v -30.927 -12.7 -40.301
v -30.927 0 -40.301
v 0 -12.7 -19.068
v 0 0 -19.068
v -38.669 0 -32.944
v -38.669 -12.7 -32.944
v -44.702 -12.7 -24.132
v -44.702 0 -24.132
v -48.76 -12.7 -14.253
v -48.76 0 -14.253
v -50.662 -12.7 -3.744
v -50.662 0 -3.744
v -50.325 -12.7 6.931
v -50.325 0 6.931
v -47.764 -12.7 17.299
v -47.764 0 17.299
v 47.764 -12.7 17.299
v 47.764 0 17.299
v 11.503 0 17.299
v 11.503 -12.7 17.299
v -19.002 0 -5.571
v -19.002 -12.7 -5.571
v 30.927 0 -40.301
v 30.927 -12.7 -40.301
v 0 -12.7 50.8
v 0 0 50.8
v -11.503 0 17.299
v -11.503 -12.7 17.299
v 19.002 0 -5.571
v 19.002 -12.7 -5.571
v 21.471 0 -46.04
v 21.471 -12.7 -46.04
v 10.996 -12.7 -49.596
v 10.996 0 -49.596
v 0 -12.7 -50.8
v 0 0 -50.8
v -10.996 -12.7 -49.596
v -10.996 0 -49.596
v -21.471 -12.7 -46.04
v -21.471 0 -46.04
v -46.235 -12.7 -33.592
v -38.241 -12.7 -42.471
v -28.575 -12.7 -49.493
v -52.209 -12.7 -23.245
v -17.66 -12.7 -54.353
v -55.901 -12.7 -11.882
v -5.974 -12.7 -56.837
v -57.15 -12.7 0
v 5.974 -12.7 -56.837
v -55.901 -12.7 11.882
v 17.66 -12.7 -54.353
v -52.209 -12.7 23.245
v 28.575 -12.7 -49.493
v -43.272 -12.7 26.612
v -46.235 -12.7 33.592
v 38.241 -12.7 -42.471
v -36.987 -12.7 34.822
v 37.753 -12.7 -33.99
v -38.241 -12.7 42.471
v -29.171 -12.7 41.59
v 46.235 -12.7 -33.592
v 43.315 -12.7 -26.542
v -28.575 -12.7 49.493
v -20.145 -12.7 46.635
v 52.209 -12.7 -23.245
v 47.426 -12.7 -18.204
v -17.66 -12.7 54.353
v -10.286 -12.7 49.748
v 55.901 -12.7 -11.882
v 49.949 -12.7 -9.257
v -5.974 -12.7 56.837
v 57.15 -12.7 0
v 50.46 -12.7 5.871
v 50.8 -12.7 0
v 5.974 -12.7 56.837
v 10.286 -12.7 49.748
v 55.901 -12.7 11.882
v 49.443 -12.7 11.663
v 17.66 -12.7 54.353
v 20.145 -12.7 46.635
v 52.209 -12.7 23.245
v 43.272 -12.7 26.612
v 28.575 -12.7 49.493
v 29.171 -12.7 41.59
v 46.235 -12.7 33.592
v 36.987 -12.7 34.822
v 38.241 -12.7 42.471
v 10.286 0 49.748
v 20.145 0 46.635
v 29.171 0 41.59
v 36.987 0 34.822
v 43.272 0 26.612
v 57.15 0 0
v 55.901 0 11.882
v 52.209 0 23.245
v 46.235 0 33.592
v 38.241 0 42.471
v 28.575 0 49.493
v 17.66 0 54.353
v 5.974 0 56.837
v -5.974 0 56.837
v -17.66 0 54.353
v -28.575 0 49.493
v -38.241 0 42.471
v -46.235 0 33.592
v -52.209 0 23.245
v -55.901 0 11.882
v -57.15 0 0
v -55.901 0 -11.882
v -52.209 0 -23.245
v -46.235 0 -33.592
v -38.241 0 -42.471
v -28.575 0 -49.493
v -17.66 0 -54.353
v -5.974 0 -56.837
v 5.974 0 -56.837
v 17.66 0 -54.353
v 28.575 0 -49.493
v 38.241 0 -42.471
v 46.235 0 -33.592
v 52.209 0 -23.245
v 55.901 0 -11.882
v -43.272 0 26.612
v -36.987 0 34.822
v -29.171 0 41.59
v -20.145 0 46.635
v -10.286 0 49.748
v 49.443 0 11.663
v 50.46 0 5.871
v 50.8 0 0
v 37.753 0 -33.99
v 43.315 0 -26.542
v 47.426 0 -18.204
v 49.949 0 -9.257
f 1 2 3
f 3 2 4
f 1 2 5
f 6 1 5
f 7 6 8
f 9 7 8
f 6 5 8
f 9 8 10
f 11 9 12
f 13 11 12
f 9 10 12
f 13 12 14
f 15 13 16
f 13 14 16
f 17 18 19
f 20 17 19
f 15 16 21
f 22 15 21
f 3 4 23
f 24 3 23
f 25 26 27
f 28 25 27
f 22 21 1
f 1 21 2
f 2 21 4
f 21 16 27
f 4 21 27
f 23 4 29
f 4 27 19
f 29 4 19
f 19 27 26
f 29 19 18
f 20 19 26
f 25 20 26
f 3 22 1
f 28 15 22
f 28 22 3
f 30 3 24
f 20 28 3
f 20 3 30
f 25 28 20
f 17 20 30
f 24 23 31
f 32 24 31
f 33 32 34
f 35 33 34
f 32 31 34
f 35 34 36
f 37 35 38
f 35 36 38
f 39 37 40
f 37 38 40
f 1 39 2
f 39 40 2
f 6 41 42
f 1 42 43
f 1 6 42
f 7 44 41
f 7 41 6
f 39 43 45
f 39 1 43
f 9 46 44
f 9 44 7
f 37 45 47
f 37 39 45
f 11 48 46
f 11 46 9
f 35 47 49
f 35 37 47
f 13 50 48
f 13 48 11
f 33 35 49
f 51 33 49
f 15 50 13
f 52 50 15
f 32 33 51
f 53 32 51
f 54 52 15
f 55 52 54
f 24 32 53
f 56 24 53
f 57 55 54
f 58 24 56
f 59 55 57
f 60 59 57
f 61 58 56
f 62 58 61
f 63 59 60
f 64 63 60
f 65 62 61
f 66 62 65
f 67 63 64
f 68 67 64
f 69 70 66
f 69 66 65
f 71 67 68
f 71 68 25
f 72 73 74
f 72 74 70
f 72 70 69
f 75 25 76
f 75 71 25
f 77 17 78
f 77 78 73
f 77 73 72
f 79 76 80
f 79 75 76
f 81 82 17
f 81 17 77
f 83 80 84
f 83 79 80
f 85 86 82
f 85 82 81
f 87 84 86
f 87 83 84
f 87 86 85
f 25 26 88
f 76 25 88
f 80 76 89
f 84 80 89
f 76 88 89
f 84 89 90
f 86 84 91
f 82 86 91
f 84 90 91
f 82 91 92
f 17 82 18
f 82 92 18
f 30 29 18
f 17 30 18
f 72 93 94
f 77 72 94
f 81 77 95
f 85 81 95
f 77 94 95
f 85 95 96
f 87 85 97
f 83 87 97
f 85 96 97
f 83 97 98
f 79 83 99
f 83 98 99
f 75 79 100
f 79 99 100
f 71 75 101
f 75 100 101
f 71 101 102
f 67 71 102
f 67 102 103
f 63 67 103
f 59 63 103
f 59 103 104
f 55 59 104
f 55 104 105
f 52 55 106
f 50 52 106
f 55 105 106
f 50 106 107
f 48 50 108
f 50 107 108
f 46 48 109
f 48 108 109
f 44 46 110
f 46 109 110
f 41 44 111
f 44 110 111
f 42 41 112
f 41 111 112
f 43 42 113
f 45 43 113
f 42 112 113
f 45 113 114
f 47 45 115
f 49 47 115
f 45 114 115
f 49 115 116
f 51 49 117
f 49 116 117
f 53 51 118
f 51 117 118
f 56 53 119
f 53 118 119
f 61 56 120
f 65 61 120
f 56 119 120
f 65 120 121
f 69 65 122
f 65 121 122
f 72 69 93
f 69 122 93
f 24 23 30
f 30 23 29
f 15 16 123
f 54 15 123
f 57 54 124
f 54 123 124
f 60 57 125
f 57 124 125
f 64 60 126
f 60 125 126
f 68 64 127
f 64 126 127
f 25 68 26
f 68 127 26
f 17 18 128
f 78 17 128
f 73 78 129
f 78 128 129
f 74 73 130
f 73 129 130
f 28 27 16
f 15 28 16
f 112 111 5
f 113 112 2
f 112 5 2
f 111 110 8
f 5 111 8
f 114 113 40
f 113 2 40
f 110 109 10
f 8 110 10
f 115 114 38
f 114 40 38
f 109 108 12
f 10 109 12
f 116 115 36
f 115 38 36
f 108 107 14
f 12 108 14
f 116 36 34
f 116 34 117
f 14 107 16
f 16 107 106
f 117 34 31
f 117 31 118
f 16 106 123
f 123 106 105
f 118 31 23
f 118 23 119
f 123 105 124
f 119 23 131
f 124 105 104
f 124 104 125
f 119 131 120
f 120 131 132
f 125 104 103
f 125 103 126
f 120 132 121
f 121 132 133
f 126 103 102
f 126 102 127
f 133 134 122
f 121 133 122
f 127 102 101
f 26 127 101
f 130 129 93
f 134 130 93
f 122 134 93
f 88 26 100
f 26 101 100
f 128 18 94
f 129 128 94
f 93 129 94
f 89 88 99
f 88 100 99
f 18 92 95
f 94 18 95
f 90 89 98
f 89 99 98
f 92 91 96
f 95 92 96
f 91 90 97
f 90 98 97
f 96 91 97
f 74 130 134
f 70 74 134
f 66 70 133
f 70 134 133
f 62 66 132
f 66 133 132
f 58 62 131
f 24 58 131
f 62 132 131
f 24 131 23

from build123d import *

# Parameters (mm, degrees)
F0_R     = 57.15
F1_DEPTH = 12.7


with BuildPart() as f1:
    # F0 (on Front) → F1 (new body)
    with BuildSketch(Plane.XZ):
        Circle(F0_R)
        with BuildLine():
            ThreePointArc((47.763775, 17.299184), (50.035187, 8.781805), (50.8, 0))
            ThreePointArc((50.8, 0), (45.561699, -22.467122), (30.927103, -40.300798))
            ThreePointArc((30.927103, -40.300798), (0, -50.8), (-30.927103, -40.300798))
            ThreePointArc((-30.927103, -40.300798), (-48.759646, -14.252612), (-47.763775, 17.299184))
            ThreePointArc((-47.763775, 17.299184), (-29.170546, 41.589894), (0, 50.8))
            ThreePointArc((0, 50.8), (29.170546, 41.589894), (47.763775, 17.299184))
        make_face(mode=Mode.SUBTRACT)
        Polygon((19.001698, -5.570812), (47.763775, 17.299184), (11.503339, 17.299184), (0, 50.8), (-11.503339, 17.299184), (-47.763775, 17.299184), (-19.001698, -5.570812), (-30.927103, -40.300798), (0, -19.067856), (30.927103, -40.300798), align=None)
    extrude(amount=F1_DEPTH)


solid = f1.part
